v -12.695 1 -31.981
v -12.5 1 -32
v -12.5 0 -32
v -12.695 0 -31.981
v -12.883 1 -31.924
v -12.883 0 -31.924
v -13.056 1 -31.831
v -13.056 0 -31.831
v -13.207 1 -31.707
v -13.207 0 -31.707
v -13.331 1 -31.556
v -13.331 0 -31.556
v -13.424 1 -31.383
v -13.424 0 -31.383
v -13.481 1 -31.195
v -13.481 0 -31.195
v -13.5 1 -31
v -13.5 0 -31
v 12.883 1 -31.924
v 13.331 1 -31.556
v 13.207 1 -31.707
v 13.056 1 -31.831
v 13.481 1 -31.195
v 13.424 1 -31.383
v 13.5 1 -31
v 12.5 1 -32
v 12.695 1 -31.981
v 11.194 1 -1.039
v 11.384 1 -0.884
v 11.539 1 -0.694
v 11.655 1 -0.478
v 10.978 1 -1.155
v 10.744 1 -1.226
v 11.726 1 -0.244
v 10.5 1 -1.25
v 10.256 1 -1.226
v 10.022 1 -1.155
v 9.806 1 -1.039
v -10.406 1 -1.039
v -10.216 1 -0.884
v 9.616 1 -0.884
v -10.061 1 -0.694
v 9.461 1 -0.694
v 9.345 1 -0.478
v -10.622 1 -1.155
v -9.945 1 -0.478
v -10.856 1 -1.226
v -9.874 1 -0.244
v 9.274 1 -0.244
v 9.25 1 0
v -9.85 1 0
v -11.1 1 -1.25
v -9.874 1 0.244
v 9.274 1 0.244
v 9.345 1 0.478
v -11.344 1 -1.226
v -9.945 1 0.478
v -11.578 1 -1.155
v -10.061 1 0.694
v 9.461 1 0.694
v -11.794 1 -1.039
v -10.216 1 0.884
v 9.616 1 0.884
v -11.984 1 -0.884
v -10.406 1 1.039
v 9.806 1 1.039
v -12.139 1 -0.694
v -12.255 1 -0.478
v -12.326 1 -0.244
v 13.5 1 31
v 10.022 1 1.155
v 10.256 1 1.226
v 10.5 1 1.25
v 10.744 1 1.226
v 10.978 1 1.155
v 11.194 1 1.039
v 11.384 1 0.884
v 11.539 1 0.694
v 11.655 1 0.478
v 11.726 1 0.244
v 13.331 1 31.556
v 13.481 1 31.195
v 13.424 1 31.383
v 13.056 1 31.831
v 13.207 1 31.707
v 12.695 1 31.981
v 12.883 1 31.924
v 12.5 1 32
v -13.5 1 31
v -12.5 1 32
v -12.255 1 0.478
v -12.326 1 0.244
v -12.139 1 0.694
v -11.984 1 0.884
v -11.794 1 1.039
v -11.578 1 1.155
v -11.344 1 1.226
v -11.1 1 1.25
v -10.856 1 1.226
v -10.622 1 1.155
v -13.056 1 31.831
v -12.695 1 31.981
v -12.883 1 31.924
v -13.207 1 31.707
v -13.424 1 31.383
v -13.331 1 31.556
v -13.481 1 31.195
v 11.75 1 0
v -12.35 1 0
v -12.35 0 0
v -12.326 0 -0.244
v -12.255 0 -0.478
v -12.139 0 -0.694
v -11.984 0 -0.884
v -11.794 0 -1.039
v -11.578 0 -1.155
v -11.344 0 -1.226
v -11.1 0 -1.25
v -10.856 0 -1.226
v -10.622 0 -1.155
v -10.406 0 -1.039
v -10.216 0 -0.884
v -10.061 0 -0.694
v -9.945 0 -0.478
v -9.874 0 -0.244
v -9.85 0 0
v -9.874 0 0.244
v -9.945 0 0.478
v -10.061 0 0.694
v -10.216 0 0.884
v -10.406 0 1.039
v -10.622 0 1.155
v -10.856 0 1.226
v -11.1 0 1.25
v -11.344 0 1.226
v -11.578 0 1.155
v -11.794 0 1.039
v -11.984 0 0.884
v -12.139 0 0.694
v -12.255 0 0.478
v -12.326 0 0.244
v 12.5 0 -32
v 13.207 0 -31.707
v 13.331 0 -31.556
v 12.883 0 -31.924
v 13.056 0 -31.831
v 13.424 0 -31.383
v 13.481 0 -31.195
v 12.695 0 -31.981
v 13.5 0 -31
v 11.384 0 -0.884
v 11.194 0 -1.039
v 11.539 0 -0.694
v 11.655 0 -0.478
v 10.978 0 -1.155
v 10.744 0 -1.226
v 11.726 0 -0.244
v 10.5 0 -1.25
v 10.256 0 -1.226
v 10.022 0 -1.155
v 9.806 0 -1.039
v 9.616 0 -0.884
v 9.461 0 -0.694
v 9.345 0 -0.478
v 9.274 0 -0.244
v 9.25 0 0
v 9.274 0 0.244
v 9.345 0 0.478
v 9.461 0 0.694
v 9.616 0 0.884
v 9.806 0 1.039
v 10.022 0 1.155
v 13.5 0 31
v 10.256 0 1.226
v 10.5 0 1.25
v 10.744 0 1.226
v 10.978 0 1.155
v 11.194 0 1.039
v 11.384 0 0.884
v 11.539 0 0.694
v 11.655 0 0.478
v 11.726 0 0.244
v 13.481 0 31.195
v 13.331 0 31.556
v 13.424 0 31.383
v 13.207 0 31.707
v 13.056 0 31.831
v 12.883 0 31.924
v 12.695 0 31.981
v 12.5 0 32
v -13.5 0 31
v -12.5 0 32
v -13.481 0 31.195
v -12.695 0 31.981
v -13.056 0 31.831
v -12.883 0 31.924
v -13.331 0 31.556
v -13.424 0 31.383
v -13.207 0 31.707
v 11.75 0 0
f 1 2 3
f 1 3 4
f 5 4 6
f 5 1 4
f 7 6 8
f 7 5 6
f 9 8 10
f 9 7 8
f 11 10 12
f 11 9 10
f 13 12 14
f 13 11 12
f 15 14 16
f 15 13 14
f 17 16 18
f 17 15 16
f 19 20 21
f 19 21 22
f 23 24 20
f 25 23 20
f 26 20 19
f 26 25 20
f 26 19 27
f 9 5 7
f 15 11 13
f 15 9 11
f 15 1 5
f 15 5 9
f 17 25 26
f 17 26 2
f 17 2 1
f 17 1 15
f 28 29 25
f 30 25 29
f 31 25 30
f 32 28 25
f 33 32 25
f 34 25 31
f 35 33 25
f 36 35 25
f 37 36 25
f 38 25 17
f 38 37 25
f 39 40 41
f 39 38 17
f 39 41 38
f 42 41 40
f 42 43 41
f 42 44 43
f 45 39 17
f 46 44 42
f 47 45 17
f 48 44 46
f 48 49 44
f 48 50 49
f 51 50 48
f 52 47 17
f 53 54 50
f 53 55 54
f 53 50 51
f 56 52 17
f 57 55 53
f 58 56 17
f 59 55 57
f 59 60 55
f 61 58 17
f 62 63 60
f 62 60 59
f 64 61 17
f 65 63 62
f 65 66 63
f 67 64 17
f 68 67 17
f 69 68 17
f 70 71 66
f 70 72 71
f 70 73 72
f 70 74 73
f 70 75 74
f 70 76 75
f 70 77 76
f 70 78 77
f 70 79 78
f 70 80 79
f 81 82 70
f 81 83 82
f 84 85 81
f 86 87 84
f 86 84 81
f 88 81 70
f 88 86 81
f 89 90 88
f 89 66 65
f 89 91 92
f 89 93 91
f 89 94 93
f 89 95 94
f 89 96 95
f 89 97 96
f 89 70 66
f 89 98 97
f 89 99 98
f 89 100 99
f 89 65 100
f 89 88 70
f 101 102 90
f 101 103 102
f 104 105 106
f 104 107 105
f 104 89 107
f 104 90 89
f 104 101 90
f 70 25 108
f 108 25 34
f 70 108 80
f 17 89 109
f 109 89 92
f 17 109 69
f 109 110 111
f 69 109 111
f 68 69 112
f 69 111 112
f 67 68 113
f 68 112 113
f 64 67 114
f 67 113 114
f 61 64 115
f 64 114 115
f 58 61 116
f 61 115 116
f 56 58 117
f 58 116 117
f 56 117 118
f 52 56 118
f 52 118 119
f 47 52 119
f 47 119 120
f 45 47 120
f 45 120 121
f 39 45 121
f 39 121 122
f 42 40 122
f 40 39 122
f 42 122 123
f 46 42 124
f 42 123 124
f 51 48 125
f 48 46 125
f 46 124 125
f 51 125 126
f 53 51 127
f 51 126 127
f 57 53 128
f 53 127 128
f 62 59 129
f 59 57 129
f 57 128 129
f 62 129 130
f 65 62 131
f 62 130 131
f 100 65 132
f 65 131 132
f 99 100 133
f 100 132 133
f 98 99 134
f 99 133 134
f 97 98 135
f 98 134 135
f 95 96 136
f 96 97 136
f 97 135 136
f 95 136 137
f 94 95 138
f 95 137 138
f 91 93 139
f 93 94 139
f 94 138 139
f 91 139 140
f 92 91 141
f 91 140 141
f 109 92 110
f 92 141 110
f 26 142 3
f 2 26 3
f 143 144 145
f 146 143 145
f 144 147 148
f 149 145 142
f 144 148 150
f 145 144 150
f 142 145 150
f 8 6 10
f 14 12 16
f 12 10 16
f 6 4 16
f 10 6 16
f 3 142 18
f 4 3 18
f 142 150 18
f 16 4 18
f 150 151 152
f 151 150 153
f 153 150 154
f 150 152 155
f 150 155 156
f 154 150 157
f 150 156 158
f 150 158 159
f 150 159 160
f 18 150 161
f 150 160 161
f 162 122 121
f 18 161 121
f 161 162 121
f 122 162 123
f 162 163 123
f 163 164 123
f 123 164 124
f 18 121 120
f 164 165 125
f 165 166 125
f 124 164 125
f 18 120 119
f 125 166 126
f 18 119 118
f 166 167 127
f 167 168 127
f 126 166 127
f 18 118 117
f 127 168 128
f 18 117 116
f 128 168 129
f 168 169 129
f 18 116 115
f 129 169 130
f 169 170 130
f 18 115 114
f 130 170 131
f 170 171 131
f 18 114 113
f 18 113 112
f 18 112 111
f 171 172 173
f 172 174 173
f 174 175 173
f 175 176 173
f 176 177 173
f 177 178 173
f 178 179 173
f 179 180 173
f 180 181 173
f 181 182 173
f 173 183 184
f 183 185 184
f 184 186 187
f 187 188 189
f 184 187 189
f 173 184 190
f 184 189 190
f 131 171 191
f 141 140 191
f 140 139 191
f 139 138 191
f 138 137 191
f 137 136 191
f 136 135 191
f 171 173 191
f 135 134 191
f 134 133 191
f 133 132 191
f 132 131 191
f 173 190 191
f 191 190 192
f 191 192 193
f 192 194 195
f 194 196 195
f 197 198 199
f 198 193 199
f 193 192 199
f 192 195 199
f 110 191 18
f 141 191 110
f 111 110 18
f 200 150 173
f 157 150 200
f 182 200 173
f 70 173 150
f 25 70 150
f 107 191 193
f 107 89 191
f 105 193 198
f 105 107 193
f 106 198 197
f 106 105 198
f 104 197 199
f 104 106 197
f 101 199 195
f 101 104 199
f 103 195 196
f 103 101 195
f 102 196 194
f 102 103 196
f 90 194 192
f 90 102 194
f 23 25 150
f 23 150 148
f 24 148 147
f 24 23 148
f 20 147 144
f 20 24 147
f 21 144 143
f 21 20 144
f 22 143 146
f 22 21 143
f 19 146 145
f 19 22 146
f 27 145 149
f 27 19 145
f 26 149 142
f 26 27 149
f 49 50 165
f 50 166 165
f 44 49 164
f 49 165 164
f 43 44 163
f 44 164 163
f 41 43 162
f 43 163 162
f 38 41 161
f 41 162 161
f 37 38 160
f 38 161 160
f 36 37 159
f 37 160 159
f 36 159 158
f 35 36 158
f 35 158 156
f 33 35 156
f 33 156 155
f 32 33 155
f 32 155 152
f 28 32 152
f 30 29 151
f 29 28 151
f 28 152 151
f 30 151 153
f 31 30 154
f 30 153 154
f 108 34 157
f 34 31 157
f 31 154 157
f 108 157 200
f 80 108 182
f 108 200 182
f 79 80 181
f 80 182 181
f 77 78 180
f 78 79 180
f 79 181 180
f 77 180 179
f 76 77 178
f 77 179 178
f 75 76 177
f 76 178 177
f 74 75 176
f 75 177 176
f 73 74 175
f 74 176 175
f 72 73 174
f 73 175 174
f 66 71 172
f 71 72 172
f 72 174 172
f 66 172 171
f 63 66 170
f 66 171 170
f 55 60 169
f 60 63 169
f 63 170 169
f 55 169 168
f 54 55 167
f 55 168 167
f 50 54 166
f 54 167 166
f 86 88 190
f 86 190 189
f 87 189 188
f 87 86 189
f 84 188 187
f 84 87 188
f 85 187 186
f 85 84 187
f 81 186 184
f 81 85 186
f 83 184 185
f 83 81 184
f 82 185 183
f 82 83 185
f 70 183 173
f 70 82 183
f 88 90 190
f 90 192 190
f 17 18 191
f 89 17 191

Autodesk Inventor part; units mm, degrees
ref_plane "YZ Plane" through (0, 0, 0) normal (1, 0, 0) x (0, 1, 0)
ref_plane "XZ Plane" through (0, 0, 0) normal (0, 1, 0) x (-1, 0, 0)
ref_plane "XY Plane" through (0, 0, 0) normal (0, 0, 1) x (1, 0, 0)
sketch "Sketch1" plane through (0, 0, 0) normal (0, 1, 0) x (-1, 0, 0)
  line L0 (-13.5, -32) -> (13.5, -32)
  line L1 (13.5, -32) -> (13.5, 32)
  line L2 (13.5, 32) -> (-13.5, 32)
  line L3 (-13.5, 32) -> (-13.5, -32)
  line L4 (-13.5, -32) -> (13.5, 32) construction
  line L5 (13.5, -32) -> (-13.5, 32) construction
  circle A0 centre (11.1, 0) radius 1.25
  circle A1 centre (-10.5, 0) radius 1.25
  point P0 (0, 0)
  point P1 (13.5, 0)
  dimension "d0" = 64
  dimension "d1" = 27
  dimension "d2" = 2.5
  dimension "d3" = 21.6
  dimension "d5" = 2.5
  dimension "d8" = 3
extrude "Extrusion1" add sketch "Sketch1" along normal blind 1
fillet "Fillet1" radius 1 4 edges at (13.5, 0.5, 32) (-13.5, 0.5, 32) (13.5, 0.5, -32) (-13.5, 0.5, -32)
properties part number "PCB_2"
